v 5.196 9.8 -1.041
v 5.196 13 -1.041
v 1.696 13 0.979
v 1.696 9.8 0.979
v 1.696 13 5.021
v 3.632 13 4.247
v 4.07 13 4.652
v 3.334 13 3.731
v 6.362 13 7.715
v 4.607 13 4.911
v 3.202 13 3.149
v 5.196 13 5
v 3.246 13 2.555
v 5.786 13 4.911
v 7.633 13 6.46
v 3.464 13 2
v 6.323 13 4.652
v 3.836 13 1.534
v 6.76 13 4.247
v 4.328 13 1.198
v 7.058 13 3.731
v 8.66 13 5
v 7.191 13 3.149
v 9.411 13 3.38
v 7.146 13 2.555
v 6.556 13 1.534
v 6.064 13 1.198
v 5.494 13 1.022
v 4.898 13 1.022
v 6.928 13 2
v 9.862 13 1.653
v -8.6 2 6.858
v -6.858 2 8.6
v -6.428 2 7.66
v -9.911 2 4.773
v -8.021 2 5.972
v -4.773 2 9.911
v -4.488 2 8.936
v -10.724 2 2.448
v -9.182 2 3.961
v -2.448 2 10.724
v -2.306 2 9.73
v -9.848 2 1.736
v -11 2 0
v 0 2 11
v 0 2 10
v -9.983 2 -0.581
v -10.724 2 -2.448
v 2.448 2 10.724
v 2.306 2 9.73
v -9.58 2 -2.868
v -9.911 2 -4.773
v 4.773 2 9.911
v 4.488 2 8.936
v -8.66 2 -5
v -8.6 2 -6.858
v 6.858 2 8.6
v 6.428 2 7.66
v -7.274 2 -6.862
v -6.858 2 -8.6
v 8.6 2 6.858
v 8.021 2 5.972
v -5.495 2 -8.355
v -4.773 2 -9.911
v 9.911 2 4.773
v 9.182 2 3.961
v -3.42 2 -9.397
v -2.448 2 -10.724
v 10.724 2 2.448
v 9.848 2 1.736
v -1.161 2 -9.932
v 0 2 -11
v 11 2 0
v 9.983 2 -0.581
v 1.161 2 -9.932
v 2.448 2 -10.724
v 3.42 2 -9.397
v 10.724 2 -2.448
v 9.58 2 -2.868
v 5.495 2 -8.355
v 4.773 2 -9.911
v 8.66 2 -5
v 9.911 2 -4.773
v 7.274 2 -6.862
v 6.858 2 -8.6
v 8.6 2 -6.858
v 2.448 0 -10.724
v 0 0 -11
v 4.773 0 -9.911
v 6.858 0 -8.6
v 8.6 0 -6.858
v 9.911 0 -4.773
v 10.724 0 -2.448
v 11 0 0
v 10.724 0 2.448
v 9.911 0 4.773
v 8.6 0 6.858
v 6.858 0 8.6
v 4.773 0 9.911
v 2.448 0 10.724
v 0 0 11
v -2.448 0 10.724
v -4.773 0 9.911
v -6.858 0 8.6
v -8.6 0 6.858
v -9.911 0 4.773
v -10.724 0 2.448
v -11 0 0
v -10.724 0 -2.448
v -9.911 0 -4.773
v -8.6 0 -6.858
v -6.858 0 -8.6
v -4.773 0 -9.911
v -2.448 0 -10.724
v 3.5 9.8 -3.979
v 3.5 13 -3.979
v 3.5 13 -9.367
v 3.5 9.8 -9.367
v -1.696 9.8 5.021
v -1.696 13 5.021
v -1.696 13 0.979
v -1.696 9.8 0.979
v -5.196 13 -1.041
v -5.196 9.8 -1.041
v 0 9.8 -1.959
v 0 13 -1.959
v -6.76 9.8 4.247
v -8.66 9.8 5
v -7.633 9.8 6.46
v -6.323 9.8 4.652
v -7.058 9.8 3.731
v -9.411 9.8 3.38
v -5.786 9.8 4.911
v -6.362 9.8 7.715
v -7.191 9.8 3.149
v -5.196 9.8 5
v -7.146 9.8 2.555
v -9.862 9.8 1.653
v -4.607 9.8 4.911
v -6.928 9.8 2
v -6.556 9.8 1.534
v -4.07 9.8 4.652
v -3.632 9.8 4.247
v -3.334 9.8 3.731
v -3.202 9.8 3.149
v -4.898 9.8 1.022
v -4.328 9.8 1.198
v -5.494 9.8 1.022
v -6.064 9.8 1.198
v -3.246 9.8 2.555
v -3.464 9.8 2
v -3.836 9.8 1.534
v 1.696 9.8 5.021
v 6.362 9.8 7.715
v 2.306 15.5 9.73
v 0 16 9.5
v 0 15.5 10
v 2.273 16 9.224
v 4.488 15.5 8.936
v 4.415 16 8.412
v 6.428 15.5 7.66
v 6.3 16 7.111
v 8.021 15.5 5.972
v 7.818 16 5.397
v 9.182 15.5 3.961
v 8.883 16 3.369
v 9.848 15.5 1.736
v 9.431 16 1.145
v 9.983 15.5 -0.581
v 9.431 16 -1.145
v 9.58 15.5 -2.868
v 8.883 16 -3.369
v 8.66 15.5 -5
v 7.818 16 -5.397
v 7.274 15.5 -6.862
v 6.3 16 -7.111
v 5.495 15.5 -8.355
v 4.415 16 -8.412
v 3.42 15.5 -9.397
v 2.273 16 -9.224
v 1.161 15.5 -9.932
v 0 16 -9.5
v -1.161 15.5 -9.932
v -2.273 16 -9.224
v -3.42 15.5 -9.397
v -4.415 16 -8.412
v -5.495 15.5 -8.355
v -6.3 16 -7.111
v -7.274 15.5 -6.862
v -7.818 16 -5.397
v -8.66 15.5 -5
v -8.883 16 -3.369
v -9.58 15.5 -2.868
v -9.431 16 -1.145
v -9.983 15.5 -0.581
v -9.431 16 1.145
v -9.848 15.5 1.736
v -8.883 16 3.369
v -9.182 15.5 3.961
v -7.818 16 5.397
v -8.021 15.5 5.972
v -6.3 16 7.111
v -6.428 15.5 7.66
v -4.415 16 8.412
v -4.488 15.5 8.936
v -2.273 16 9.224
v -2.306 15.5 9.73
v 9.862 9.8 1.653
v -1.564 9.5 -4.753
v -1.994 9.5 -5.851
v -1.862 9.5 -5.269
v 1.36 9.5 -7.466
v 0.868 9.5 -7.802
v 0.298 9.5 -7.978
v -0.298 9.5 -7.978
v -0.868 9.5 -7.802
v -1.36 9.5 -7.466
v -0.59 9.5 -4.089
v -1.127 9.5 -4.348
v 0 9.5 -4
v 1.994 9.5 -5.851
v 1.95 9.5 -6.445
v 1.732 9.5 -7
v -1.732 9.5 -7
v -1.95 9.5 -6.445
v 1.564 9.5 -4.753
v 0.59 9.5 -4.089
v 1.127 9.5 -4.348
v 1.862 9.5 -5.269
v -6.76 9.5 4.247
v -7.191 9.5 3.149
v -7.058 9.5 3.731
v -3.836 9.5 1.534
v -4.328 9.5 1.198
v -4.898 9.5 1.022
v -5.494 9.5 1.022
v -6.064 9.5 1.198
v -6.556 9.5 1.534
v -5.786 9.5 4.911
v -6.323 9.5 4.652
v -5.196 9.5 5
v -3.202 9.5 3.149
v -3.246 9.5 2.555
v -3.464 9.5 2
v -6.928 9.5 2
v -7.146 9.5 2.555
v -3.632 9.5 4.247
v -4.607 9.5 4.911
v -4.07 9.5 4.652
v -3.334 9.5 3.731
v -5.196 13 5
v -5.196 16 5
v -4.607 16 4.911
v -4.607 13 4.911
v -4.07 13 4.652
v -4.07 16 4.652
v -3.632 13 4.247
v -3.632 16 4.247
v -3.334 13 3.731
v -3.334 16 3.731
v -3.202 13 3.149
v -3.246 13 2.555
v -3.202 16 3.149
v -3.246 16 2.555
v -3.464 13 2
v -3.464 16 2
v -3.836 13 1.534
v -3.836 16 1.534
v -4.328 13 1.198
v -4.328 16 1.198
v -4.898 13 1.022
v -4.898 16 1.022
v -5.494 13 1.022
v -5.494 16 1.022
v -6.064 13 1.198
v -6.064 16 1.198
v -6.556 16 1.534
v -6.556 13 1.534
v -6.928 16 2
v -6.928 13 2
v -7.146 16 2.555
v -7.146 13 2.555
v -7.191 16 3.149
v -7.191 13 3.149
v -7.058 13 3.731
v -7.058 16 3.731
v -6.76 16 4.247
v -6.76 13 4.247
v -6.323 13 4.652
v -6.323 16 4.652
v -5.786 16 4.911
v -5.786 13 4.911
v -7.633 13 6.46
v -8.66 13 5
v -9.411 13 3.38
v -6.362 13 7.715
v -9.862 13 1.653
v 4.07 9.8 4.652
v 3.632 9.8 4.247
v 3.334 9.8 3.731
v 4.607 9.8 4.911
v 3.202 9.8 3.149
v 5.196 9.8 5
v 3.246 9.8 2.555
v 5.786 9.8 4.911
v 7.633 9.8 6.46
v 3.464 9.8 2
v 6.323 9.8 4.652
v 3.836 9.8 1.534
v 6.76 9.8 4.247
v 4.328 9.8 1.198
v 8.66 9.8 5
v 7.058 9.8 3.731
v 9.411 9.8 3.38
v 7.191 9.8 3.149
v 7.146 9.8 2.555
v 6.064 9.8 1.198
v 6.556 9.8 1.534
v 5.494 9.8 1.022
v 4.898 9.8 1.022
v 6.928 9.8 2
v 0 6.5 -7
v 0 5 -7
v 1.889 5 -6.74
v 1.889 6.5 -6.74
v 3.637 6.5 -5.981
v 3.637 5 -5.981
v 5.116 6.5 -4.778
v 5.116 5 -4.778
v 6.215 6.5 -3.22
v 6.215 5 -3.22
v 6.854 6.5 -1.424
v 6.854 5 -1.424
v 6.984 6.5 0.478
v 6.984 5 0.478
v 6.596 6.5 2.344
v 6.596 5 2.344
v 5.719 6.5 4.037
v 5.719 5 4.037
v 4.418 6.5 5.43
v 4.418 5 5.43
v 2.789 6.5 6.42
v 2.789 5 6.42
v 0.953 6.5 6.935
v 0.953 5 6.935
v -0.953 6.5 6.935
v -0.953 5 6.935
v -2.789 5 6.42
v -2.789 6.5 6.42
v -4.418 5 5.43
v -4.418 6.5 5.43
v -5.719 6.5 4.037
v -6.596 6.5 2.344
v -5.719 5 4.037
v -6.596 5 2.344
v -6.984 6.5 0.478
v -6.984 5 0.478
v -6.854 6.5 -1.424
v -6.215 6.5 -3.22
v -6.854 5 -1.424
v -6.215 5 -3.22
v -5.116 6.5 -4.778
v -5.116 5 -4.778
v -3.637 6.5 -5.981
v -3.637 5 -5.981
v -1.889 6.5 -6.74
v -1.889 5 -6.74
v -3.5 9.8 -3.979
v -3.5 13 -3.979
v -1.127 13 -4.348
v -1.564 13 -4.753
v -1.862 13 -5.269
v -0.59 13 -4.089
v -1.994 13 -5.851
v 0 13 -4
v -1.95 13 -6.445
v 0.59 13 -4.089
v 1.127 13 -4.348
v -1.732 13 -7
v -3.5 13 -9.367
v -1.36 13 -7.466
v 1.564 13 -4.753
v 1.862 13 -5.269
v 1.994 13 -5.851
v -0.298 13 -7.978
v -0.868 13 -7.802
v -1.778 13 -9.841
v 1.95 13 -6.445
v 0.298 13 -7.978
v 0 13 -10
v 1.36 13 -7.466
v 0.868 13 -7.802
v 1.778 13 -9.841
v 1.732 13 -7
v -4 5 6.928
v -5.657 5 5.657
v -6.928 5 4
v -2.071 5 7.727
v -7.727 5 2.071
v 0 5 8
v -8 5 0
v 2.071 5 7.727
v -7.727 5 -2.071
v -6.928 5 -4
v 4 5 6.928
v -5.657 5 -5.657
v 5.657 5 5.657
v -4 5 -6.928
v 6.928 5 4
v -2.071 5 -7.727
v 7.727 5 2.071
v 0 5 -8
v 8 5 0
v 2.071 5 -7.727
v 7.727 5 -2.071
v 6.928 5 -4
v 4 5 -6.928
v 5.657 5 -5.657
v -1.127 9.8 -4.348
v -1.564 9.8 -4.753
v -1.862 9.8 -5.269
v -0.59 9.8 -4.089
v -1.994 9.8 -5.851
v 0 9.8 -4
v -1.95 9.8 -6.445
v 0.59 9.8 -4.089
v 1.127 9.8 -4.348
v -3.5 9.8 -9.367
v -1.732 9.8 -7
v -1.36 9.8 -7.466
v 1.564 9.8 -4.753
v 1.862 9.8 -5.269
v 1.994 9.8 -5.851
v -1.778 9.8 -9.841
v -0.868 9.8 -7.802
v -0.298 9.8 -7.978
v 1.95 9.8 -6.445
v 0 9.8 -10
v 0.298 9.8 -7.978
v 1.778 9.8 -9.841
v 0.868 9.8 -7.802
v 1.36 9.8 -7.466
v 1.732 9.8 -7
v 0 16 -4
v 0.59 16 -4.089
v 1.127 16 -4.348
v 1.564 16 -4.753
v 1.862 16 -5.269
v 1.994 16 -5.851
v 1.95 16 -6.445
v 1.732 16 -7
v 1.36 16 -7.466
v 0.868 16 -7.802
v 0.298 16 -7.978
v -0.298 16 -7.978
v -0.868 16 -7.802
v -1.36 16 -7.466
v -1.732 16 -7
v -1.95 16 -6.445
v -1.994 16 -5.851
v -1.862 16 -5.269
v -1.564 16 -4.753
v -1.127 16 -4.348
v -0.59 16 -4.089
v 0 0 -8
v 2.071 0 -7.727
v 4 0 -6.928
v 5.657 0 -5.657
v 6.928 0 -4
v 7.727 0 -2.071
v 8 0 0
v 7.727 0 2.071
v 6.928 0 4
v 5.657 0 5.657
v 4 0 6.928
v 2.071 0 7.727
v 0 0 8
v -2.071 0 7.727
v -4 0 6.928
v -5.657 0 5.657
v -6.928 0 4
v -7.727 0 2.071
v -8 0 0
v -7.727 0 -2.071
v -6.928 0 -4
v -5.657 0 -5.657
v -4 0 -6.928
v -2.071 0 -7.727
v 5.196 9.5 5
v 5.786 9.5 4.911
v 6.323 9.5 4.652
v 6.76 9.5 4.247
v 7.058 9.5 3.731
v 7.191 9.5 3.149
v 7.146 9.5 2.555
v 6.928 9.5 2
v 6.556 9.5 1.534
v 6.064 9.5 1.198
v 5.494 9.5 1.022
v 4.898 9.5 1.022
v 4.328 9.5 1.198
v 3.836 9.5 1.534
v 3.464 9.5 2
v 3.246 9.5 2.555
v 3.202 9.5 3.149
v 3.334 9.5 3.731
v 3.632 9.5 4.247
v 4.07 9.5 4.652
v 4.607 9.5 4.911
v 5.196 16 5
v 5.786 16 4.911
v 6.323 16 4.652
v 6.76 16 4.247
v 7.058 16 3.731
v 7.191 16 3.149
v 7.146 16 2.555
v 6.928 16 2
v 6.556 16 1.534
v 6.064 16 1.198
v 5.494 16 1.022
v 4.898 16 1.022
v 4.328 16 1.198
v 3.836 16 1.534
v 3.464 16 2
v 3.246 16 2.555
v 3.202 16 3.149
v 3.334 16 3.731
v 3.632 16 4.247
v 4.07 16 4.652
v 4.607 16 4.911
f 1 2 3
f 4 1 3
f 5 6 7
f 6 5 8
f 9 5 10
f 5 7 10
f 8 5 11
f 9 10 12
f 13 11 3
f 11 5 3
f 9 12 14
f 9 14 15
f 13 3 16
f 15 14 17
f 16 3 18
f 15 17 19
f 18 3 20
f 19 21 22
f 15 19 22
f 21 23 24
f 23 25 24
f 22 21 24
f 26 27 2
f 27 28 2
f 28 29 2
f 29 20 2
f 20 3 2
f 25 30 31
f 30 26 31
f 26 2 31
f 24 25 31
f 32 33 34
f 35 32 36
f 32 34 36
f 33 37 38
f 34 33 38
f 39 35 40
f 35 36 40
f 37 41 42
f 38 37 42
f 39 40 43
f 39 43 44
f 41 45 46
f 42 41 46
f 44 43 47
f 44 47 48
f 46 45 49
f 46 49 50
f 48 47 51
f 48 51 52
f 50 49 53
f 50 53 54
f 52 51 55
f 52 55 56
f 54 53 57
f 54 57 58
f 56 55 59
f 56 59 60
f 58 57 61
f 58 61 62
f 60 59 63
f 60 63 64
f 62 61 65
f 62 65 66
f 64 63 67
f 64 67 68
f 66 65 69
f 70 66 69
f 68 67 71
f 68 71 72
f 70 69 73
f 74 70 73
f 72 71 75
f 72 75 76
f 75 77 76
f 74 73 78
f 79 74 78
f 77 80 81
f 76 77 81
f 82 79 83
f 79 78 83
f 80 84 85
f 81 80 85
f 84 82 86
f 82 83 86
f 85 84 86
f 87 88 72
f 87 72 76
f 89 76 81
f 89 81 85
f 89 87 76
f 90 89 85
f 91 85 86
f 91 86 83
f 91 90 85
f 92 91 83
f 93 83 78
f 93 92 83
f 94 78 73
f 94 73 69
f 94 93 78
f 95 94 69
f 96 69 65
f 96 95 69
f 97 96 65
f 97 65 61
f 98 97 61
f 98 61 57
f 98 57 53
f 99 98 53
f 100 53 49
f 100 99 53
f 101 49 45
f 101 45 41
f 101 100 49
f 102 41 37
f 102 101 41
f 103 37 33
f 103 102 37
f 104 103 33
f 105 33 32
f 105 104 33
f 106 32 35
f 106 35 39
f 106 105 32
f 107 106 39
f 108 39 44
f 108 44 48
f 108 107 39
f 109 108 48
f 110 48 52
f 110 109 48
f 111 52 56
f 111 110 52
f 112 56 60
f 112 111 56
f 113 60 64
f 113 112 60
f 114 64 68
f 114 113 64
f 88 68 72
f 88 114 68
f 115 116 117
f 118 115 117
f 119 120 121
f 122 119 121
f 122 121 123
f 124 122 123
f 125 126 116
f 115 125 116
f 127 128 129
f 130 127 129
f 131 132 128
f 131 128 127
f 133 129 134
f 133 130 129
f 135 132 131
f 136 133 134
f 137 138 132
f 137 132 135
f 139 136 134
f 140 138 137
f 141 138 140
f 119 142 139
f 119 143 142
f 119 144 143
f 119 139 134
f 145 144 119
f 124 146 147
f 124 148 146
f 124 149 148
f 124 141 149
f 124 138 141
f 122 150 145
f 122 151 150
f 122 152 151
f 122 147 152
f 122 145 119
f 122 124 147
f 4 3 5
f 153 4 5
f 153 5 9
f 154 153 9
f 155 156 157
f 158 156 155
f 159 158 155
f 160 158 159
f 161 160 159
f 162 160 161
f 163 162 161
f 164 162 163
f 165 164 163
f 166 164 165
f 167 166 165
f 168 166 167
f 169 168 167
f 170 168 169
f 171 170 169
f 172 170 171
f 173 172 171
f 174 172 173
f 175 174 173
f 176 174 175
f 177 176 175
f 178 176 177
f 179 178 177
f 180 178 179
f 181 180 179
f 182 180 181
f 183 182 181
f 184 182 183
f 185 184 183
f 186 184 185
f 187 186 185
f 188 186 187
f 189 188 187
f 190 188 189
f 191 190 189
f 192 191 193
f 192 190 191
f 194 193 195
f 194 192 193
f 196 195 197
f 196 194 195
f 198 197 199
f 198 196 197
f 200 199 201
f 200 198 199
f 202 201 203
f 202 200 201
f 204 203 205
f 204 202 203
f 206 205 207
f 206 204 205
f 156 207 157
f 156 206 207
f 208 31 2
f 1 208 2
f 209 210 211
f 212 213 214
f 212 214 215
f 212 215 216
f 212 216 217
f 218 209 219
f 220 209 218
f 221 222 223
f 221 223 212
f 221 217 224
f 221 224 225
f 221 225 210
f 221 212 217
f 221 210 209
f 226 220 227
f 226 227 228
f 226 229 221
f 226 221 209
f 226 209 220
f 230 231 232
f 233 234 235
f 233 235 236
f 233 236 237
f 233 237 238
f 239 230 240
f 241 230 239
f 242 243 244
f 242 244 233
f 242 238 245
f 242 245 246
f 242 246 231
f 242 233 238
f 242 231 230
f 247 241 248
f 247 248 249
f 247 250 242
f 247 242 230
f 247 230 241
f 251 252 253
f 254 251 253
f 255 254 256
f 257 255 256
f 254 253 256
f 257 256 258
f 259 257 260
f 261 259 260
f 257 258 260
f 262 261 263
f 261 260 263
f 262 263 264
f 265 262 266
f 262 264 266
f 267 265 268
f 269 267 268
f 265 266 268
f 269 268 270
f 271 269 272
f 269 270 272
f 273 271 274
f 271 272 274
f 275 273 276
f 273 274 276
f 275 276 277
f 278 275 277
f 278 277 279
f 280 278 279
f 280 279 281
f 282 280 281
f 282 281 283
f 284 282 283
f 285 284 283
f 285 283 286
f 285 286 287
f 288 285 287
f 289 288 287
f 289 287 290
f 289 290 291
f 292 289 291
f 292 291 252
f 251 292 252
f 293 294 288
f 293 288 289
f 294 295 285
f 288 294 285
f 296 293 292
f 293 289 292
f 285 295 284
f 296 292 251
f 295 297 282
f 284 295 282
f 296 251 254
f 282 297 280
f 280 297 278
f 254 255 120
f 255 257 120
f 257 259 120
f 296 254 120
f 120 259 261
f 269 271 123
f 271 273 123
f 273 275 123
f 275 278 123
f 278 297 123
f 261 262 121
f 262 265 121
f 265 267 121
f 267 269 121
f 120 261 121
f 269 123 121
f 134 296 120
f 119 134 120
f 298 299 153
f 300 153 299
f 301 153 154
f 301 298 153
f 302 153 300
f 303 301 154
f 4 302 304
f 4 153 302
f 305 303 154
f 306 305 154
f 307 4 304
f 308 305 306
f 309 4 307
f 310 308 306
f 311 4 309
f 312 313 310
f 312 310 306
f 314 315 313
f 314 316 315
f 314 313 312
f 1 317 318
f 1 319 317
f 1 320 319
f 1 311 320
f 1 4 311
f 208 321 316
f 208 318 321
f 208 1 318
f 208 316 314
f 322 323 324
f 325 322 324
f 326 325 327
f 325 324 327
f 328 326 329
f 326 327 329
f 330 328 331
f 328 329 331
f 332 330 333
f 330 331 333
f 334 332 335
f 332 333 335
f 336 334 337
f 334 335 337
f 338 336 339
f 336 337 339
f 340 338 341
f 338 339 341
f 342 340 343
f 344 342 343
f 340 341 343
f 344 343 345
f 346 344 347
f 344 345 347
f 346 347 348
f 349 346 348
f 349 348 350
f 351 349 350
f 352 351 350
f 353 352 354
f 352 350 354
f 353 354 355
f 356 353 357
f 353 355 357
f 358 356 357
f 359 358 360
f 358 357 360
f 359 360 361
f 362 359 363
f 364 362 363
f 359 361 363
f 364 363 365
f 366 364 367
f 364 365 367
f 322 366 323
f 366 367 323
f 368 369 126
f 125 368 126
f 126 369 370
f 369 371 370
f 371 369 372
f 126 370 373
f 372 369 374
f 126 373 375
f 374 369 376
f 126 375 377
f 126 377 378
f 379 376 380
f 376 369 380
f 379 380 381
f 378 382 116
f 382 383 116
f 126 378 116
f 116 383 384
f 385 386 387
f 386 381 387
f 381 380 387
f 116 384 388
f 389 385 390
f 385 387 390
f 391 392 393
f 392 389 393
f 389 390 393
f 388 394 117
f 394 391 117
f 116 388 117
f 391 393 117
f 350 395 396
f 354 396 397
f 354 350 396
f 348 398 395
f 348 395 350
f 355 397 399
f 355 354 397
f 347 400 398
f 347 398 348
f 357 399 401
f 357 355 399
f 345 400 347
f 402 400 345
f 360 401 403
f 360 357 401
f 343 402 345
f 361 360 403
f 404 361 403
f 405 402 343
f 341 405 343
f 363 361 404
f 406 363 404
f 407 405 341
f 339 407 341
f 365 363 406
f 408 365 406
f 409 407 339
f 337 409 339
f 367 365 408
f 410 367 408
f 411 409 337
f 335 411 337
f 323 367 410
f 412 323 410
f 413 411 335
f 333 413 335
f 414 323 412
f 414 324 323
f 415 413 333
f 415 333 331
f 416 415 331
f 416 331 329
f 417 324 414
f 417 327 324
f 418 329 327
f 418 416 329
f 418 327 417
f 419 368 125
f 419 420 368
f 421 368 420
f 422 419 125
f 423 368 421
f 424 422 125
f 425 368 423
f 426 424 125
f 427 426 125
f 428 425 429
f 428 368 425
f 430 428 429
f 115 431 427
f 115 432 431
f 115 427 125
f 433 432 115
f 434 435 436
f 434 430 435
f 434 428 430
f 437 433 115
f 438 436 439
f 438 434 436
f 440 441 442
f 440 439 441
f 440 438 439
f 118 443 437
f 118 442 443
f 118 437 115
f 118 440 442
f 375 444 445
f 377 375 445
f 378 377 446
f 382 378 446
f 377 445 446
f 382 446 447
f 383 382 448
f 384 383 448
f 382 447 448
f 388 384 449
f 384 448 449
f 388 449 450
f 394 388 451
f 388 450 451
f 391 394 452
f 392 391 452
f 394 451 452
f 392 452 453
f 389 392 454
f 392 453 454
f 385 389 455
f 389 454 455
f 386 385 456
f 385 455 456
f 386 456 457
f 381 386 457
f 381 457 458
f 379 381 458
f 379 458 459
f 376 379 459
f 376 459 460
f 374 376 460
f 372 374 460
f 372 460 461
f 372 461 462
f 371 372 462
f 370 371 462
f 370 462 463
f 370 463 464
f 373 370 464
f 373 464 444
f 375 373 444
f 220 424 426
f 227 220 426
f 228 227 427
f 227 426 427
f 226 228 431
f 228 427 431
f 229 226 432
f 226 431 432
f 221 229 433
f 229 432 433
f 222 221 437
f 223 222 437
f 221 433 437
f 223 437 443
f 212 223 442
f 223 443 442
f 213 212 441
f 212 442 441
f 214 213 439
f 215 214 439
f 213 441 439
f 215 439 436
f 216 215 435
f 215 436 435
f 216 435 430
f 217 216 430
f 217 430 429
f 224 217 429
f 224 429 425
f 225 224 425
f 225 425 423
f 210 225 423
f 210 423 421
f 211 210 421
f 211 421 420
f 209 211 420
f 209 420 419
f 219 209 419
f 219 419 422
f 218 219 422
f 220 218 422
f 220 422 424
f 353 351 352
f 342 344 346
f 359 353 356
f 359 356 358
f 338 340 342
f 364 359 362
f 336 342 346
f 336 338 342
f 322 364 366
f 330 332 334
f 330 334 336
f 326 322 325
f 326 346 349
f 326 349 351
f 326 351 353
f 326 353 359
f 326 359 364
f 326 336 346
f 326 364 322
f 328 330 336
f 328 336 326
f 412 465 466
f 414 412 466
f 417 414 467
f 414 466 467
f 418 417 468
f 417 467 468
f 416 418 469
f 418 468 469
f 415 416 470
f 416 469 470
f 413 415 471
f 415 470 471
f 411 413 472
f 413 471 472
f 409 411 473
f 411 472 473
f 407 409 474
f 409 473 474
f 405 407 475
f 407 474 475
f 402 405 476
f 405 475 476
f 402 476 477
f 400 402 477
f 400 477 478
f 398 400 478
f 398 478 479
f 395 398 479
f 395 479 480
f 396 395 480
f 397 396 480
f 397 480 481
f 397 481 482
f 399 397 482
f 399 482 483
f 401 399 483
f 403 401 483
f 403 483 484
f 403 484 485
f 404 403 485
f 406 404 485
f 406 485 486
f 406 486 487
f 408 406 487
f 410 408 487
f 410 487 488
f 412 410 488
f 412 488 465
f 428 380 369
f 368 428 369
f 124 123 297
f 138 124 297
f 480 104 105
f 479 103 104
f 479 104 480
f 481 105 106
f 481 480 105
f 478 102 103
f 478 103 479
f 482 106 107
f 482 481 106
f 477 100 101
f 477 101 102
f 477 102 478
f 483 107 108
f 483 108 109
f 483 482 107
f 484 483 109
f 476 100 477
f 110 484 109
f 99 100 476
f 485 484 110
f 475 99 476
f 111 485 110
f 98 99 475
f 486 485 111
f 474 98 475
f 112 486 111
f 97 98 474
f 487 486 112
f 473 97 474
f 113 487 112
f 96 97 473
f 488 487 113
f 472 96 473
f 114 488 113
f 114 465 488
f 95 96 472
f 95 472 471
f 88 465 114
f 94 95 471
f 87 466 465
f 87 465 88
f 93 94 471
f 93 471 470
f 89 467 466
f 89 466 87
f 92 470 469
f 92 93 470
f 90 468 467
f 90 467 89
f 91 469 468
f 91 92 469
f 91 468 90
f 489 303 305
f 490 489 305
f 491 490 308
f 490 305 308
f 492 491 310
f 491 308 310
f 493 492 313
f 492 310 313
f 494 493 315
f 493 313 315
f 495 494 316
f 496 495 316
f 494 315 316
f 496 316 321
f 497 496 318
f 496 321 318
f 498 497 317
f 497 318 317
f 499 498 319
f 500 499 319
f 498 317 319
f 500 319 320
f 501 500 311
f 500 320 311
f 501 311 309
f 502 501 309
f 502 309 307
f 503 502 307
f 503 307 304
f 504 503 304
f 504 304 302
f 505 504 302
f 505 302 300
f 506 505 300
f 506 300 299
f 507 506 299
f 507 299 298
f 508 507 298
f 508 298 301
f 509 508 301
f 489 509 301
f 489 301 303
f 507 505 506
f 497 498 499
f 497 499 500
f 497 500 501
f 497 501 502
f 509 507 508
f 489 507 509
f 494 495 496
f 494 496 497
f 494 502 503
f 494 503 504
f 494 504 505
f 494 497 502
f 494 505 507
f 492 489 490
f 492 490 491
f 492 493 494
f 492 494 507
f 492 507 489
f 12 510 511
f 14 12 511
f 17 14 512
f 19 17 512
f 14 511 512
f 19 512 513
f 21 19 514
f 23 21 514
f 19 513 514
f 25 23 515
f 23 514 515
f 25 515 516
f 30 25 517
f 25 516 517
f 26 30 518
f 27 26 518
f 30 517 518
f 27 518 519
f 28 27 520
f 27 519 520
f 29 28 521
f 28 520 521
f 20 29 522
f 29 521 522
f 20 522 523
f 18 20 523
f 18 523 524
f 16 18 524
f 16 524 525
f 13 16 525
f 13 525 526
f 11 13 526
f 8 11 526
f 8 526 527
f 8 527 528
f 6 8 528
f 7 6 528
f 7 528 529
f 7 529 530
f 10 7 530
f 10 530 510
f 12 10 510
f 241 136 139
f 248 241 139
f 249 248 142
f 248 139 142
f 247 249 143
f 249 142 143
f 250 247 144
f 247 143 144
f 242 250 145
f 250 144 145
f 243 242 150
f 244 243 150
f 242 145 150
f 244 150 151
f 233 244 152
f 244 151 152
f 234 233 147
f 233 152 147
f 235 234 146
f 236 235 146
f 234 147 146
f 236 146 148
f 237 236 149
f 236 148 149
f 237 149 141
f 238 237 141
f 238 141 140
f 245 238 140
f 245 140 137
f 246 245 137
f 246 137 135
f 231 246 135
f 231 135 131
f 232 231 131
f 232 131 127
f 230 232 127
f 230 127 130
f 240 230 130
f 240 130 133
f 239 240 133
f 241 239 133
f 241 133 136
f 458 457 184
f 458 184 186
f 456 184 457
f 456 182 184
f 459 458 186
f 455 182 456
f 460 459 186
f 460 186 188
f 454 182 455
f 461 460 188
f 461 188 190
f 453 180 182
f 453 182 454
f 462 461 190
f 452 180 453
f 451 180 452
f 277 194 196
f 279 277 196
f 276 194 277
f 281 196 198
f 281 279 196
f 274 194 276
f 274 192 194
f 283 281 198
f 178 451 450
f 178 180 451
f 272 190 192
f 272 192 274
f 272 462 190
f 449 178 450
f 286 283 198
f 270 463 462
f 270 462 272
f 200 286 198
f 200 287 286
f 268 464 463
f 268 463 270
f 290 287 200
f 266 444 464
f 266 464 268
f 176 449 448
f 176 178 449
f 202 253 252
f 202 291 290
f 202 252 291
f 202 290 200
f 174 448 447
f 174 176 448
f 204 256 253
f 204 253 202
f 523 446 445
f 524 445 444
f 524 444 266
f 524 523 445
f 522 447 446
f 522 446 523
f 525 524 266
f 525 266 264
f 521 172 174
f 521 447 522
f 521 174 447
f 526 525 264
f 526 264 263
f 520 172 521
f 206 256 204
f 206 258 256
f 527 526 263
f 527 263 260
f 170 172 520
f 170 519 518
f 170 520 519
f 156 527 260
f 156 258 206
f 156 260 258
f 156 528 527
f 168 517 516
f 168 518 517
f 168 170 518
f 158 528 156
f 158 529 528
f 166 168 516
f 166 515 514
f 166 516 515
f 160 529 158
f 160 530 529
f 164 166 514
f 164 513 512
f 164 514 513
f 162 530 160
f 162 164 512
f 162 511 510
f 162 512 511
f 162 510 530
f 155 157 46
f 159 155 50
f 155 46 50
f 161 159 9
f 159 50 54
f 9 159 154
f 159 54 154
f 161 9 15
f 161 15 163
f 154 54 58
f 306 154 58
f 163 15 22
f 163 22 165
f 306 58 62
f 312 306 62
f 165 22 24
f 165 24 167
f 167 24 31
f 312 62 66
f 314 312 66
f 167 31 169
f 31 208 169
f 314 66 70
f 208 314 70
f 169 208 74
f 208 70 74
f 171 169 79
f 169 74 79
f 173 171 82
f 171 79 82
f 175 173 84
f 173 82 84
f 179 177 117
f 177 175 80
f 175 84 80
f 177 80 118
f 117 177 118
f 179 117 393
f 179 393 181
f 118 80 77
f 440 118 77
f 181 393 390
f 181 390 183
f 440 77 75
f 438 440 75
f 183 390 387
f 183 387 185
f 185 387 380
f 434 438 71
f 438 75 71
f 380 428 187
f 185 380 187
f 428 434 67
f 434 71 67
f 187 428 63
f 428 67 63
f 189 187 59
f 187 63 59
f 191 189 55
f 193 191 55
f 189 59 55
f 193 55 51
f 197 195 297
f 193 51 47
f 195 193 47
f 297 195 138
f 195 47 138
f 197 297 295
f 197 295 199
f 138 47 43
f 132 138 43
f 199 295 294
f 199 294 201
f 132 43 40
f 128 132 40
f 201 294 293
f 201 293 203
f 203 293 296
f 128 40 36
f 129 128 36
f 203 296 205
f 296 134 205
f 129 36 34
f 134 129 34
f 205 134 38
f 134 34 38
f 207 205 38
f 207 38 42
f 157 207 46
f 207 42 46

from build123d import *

# Parameters (mm, degrees)
SKETCH1_R           = 10
BOSS_EXTRUDE1_DEPTH = 16
SKETCH2_R           = 11
SKETCH2_R_2         = 10
BOSS_EXTRUDE2_DEPTH = 2
SKETCH3_R           = 8
CUT_EXTRUDE1_DEPTH  = 6.5
SKETCH4_R           = 2
CUT_EXTRUDE2_DEPTH  = 6.5
CUT_EXTRUDE3_START  = -3
SKETCH5_R           = 2
CUT_EXTRUDE3_DEPTH  = 3.2
BOSS_EXTRUDE3_START = -5
SKETCH6_R           = 8
SKETCH6_R_2         = 7
BOSS_EXTRUDE3_DEPTH = 1.5
CHAMFER1_SIZE       = 0.5


with BuildPart() as part:
    # Sketch1 → Boss-Extrude1 (new body)
    with BuildSketch(Plane(origin=(0, 0, 0), x_dir=(1, 0, 0), z_dir=(0, 1, 0))):
        with Locations(Location((0, 0, 0), (0, 0, 270))):
            Circle(SKETCH1_R)
    extrude(amount=BOSS_EXTRUDE1_DEPTH)

    # Sketch2 → Boss-Extrude2 (add)
    with BuildSketch(Plane.XZ):
        with Locations(Location((0, 0, 0), (0, 0, 270))):
            Circle(SKETCH2_R)
        with Locations(Location((0, 0, 0), (0, 0, 270))):
            Circle(SKETCH2_R_2, mode=Mode.SUBTRACT)
    extrude(amount=-BOSS_EXTRUDE2_DEPTH)

    # Sketch3 → Cut-Extrude1 (cut)
    with BuildSketch(Plane.XZ):
        with Locations(Location((0, 0, 0), (0, 0, 270))):
            Circle(SKETCH3_R)
    extrude(amount=-CUT_EXTRUDE1_DEPTH, mode=Mode.SUBTRACT)

    # Sketch4 → Cut-Extrude2 (cut)
    with BuildSketch(Plane(origin=(0, 16, 0), x_dir=(1, 0, 0), z_dir=(0, 1, 0))):
        with Locations(Location((0, 6, 0), (0, 0, 270))):
            Circle(SKETCH4_R)
        with Locations(Location((5.196152423, -3, 0), (0, 0, 270))):
            Circle(SKETCH4_R)
        with Locations(Location((-5.196152423, -3, 0), (0, 0, 270))):
            Circle(SKETCH4_R)
    extrude(amount=-CUT_EXTRUDE2_DEPTH, mode=Mode.SUBTRACT)

    # Sketch5 → Cut-Extrude3 (cut)
    # profile 1 of 3: a face of its own
    with BuildSketch(Plane(origin=(0, 16, 0), x_dir=(1, 0, 0), z_dir=(0, 1, 0)).offset(CUT_EXTRUDE3_START)):
        with BuildLine():
            Line((-3.5, 9.367496998), (-3.5, 3.979274058))
            Line((-3.5, 3.979274058), (0, 1.958548116))
            Line((0, 1.958548116), (3.5, 3.979274058))
            Line((3.5, 3.979274058), (3.5, 9.367496998))
            ThreePointArc((3.5, 9.367496998), (0, 10), (-3.5, 9.367496998))
        make_face()
        with Locations(Location((0, 6, 0), (0, 0, 270))):
            Circle(SKETCH5_R, mode=Mode.SUBTRACT)
    # profile 2 of 3: a face of its own
    with BuildSketch(Plane(origin=(0, 16, 0), x_dir=(1, 0, 0), z_dir=(0, 1, 0)).offset(CUT_EXTRUDE3_START)):
        with BuildLine():
            ThreePointArc((-9.86249037, -1.652659586), (-8.660254038, -5), (-6.36249037, -7.714837412))
            Line((-6.36249037, -7.714837412), (-1.696152423, -5.020725942))
            Line((-1.696152423, -5.020725942), (-1.696152423, -0.979274058))
            Line((-1.696152423, -0.979274058), (-5.196152423, 1.041451884))
            Line((-5.196152423, 1.041451884), (-9.86249037, -1.652659586))
        make_face()
        with Locations(Location((-5.196152423, -3, 0), (0, 0, 270))):
            Circle(SKETCH5_R, mode=Mode.SUBTRACT)
    # profile 3 of 3: a face of its own
    with BuildSketch(Plane(origin=(0, 16, 0), x_dir=(1, 0, 0), z_dir=(0, 1, 0)).offset(CUT_EXTRUDE3_START)):
        with BuildLine():
            Line((9.86249037, -1.652659586), (5.196152423, 1.041451884))
            Line((5.196152423, 1.041451884), (1.696152423, -0.979274058))
            Line((1.696152423, -0.979274058), (1.696152423, -5.020725942))
            Line((1.696152423, -5.020725942), (6.36249037, -7.714837412))
            ThreePointArc((6.36249037, -7.714837412), (8.660254038, -5), (9.86249037, -1.652659586))
        make_face()
        with Locations(Location((5.196152423, -3, 0), (0, 0, 270))):
            Circle(SKETCH5_R, mode=Mode.SUBTRACT)
    extrude(amount=-CUT_EXTRUDE3_DEPTH, mode=Mode.SUBTRACT)

    # Sketch6 → Boss-Extrude3 (add)
    with BuildSketch(Plane.XZ.offset(BOSS_EXTRUDE3_START)):
        with Locations(Location((0, 0, 0), (0, 0, 270))):
            Circle(SKETCH6_R)
        with Locations(Location((0, 0, 0), (0, 0, 270))):
            Circle(SKETCH6_R_2, mode=Mode.SUBTRACT)
    extrude(amount=-BOSS_EXTRUDE3_DEPTH)

    # Chamfer1
    chamfer1_edges = [part.edges().sort_by_distance(p)[0] for p in [
        (0, 16, -10),
    ]]
    chamfer(chamfer1_edges, length=CHAMFER1_SIZE)


solid = part.part
